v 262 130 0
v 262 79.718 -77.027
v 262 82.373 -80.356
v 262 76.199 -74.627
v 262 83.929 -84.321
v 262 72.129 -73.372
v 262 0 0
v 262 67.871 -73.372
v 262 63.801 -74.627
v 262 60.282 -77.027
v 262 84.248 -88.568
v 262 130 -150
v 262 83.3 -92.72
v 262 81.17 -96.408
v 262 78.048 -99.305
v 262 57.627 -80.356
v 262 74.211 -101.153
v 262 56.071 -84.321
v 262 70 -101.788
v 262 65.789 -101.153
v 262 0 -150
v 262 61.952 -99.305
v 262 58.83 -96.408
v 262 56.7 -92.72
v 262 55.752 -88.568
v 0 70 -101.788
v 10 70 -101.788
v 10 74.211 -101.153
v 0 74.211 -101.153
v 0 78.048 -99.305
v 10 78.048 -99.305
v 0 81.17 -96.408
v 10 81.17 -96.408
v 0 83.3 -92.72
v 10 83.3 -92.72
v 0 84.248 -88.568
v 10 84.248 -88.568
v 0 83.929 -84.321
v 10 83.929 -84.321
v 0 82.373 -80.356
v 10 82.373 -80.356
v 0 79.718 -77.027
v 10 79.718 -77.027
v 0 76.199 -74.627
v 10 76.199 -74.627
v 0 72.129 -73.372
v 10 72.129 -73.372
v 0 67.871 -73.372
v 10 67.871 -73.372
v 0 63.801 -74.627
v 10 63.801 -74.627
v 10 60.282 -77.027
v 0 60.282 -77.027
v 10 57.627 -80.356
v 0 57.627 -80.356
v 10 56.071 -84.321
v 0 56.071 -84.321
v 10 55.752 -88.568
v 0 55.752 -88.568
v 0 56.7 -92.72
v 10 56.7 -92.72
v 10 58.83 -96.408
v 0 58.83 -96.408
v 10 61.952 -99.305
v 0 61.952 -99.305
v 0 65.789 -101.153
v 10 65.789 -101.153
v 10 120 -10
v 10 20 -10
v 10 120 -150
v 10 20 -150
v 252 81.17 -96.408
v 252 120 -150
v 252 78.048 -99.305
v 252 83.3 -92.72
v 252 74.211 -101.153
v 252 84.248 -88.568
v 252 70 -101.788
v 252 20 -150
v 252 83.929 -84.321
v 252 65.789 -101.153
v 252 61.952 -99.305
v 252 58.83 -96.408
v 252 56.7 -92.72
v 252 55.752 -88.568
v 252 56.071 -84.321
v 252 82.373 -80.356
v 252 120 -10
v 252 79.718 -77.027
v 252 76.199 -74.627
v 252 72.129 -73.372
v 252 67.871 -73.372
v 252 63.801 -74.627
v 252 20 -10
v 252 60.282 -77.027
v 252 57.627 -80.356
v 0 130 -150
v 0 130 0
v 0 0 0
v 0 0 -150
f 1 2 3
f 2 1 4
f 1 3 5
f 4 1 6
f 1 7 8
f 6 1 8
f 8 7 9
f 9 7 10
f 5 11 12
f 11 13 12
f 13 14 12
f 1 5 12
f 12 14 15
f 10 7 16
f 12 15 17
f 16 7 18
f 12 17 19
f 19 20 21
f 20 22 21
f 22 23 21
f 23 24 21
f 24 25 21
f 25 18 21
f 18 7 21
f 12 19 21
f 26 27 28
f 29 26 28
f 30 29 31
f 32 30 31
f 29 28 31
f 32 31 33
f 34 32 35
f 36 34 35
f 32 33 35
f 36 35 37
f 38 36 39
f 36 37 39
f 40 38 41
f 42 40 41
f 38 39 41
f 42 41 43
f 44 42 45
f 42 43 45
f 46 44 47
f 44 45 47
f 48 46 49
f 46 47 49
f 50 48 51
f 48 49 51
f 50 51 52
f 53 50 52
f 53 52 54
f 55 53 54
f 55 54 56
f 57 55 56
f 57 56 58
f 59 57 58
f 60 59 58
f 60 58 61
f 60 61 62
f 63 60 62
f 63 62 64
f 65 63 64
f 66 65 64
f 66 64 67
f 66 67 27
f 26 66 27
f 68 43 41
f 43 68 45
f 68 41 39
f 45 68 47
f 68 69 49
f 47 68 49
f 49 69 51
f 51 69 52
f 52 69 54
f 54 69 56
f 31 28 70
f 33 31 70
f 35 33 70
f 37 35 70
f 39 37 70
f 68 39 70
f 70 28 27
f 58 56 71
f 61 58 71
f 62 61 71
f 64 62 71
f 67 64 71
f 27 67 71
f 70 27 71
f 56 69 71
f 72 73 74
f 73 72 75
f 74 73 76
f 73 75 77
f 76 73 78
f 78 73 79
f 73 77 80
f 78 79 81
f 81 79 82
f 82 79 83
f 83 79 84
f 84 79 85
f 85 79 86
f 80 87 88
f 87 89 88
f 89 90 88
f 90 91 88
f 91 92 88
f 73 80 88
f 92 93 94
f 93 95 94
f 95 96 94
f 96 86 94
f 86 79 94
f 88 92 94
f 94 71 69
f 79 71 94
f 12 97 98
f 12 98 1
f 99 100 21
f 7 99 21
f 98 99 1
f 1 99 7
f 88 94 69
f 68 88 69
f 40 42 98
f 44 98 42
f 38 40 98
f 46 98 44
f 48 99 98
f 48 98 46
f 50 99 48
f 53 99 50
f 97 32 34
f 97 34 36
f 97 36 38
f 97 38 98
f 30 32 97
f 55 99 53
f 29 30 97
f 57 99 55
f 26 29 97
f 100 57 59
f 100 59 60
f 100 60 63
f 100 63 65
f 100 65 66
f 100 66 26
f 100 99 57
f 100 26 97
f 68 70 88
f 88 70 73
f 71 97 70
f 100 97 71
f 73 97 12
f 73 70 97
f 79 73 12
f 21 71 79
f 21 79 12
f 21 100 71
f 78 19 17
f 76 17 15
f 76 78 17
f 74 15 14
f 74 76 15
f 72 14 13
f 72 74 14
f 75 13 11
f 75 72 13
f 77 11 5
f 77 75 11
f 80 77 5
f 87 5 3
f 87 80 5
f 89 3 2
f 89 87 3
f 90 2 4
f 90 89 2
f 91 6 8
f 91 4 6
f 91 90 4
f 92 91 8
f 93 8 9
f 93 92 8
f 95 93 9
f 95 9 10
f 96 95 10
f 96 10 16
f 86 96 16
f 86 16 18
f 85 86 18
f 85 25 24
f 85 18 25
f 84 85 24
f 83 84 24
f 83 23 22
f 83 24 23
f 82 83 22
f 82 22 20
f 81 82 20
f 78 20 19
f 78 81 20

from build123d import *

# Parameters (mm, degrees)
SKETCH1_W           = 262
SKETCH1_H           = 150
BOSS_EXTRUDE1_DEPTH = 20
BOSS_EXTRUDE2_DEPTH = 100
SKETCH3_R           = 14.2875
CUT_EXTRUDE1_DEPTH  = 11
SKETCH4_R           = 14.2875
CUT_EXTRUDE2_DEPTH  = 11
SKETCH5_W           = 262
SKETCH5_H           = 150
BOSS_EXTRUDE4_DEPTH = 10


with BuildPart() as part:
    # Sketch1 → Boss-Extrude1 (new body)
    with BuildSketch(Plane(origin=(0, 0, 0), x_dir=(1, 0, 0), z_dir=(0, 1, 0))):
        with Locations((131, 75)):
            Rectangle(SKETCH1_W, SKETCH1_H)
    extrude(amount=BOSS_EXTRUDE1_DEPTH)

    # Sketch2 → Boss-Extrude2 (add)
    with BuildSketch(Plane(origin=(0, 20, 0), x_dir=(1, 0, 0), z_dir=(0, 1, 0))):
        Polygon((0, 0), (262, 0), (262, 150), (252, 150), (252, 10), (10, 10), (10, 150), (0, 150), align=None)
    extrude(amount=BOSS_EXTRUDE2_DEPTH)

    # Sketch3 → Cut-Extrude1 (cut, through all)
    with BuildSketch(Plane(origin=(10, 0, 0), x_dir=(0, 0, -1), z_dir=(1, 0, 0))):
        with Locations((87.5, 70)):
            Circle(SKETCH3_R)
    extrude(amount=-CUT_EXTRUDE1_DEPTH, mode=Mode.SUBTRACT)

    # Sketch4 → Cut-Extrude2 (cut, through all)
    with BuildSketch(Plane(origin=(252, 0, 0), x_dir=(0, 0, -1), z_dir=(1, 0, 0))):
        with Locations((87.5, 70)):
            Circle(SKETCH4_R)
    extrude(amount=CUT_EXTRUDE2_DEPTH, mode=Mode.SUBTRACT)

    # Sketch5 → Boss-Extrude4 (add)
    with BuildSketch(Plane(origin=(0, 120, 0), x_dir=(1, 0, 0), z_dir=(0, 1, 0))):
        with Locations((131, 75)):
            Rectangle(SKETCH5_W, SKETCH5_H)
    extrude(amount=BOSS_EXTRUDE4_DEPTH)


solid = part.part
